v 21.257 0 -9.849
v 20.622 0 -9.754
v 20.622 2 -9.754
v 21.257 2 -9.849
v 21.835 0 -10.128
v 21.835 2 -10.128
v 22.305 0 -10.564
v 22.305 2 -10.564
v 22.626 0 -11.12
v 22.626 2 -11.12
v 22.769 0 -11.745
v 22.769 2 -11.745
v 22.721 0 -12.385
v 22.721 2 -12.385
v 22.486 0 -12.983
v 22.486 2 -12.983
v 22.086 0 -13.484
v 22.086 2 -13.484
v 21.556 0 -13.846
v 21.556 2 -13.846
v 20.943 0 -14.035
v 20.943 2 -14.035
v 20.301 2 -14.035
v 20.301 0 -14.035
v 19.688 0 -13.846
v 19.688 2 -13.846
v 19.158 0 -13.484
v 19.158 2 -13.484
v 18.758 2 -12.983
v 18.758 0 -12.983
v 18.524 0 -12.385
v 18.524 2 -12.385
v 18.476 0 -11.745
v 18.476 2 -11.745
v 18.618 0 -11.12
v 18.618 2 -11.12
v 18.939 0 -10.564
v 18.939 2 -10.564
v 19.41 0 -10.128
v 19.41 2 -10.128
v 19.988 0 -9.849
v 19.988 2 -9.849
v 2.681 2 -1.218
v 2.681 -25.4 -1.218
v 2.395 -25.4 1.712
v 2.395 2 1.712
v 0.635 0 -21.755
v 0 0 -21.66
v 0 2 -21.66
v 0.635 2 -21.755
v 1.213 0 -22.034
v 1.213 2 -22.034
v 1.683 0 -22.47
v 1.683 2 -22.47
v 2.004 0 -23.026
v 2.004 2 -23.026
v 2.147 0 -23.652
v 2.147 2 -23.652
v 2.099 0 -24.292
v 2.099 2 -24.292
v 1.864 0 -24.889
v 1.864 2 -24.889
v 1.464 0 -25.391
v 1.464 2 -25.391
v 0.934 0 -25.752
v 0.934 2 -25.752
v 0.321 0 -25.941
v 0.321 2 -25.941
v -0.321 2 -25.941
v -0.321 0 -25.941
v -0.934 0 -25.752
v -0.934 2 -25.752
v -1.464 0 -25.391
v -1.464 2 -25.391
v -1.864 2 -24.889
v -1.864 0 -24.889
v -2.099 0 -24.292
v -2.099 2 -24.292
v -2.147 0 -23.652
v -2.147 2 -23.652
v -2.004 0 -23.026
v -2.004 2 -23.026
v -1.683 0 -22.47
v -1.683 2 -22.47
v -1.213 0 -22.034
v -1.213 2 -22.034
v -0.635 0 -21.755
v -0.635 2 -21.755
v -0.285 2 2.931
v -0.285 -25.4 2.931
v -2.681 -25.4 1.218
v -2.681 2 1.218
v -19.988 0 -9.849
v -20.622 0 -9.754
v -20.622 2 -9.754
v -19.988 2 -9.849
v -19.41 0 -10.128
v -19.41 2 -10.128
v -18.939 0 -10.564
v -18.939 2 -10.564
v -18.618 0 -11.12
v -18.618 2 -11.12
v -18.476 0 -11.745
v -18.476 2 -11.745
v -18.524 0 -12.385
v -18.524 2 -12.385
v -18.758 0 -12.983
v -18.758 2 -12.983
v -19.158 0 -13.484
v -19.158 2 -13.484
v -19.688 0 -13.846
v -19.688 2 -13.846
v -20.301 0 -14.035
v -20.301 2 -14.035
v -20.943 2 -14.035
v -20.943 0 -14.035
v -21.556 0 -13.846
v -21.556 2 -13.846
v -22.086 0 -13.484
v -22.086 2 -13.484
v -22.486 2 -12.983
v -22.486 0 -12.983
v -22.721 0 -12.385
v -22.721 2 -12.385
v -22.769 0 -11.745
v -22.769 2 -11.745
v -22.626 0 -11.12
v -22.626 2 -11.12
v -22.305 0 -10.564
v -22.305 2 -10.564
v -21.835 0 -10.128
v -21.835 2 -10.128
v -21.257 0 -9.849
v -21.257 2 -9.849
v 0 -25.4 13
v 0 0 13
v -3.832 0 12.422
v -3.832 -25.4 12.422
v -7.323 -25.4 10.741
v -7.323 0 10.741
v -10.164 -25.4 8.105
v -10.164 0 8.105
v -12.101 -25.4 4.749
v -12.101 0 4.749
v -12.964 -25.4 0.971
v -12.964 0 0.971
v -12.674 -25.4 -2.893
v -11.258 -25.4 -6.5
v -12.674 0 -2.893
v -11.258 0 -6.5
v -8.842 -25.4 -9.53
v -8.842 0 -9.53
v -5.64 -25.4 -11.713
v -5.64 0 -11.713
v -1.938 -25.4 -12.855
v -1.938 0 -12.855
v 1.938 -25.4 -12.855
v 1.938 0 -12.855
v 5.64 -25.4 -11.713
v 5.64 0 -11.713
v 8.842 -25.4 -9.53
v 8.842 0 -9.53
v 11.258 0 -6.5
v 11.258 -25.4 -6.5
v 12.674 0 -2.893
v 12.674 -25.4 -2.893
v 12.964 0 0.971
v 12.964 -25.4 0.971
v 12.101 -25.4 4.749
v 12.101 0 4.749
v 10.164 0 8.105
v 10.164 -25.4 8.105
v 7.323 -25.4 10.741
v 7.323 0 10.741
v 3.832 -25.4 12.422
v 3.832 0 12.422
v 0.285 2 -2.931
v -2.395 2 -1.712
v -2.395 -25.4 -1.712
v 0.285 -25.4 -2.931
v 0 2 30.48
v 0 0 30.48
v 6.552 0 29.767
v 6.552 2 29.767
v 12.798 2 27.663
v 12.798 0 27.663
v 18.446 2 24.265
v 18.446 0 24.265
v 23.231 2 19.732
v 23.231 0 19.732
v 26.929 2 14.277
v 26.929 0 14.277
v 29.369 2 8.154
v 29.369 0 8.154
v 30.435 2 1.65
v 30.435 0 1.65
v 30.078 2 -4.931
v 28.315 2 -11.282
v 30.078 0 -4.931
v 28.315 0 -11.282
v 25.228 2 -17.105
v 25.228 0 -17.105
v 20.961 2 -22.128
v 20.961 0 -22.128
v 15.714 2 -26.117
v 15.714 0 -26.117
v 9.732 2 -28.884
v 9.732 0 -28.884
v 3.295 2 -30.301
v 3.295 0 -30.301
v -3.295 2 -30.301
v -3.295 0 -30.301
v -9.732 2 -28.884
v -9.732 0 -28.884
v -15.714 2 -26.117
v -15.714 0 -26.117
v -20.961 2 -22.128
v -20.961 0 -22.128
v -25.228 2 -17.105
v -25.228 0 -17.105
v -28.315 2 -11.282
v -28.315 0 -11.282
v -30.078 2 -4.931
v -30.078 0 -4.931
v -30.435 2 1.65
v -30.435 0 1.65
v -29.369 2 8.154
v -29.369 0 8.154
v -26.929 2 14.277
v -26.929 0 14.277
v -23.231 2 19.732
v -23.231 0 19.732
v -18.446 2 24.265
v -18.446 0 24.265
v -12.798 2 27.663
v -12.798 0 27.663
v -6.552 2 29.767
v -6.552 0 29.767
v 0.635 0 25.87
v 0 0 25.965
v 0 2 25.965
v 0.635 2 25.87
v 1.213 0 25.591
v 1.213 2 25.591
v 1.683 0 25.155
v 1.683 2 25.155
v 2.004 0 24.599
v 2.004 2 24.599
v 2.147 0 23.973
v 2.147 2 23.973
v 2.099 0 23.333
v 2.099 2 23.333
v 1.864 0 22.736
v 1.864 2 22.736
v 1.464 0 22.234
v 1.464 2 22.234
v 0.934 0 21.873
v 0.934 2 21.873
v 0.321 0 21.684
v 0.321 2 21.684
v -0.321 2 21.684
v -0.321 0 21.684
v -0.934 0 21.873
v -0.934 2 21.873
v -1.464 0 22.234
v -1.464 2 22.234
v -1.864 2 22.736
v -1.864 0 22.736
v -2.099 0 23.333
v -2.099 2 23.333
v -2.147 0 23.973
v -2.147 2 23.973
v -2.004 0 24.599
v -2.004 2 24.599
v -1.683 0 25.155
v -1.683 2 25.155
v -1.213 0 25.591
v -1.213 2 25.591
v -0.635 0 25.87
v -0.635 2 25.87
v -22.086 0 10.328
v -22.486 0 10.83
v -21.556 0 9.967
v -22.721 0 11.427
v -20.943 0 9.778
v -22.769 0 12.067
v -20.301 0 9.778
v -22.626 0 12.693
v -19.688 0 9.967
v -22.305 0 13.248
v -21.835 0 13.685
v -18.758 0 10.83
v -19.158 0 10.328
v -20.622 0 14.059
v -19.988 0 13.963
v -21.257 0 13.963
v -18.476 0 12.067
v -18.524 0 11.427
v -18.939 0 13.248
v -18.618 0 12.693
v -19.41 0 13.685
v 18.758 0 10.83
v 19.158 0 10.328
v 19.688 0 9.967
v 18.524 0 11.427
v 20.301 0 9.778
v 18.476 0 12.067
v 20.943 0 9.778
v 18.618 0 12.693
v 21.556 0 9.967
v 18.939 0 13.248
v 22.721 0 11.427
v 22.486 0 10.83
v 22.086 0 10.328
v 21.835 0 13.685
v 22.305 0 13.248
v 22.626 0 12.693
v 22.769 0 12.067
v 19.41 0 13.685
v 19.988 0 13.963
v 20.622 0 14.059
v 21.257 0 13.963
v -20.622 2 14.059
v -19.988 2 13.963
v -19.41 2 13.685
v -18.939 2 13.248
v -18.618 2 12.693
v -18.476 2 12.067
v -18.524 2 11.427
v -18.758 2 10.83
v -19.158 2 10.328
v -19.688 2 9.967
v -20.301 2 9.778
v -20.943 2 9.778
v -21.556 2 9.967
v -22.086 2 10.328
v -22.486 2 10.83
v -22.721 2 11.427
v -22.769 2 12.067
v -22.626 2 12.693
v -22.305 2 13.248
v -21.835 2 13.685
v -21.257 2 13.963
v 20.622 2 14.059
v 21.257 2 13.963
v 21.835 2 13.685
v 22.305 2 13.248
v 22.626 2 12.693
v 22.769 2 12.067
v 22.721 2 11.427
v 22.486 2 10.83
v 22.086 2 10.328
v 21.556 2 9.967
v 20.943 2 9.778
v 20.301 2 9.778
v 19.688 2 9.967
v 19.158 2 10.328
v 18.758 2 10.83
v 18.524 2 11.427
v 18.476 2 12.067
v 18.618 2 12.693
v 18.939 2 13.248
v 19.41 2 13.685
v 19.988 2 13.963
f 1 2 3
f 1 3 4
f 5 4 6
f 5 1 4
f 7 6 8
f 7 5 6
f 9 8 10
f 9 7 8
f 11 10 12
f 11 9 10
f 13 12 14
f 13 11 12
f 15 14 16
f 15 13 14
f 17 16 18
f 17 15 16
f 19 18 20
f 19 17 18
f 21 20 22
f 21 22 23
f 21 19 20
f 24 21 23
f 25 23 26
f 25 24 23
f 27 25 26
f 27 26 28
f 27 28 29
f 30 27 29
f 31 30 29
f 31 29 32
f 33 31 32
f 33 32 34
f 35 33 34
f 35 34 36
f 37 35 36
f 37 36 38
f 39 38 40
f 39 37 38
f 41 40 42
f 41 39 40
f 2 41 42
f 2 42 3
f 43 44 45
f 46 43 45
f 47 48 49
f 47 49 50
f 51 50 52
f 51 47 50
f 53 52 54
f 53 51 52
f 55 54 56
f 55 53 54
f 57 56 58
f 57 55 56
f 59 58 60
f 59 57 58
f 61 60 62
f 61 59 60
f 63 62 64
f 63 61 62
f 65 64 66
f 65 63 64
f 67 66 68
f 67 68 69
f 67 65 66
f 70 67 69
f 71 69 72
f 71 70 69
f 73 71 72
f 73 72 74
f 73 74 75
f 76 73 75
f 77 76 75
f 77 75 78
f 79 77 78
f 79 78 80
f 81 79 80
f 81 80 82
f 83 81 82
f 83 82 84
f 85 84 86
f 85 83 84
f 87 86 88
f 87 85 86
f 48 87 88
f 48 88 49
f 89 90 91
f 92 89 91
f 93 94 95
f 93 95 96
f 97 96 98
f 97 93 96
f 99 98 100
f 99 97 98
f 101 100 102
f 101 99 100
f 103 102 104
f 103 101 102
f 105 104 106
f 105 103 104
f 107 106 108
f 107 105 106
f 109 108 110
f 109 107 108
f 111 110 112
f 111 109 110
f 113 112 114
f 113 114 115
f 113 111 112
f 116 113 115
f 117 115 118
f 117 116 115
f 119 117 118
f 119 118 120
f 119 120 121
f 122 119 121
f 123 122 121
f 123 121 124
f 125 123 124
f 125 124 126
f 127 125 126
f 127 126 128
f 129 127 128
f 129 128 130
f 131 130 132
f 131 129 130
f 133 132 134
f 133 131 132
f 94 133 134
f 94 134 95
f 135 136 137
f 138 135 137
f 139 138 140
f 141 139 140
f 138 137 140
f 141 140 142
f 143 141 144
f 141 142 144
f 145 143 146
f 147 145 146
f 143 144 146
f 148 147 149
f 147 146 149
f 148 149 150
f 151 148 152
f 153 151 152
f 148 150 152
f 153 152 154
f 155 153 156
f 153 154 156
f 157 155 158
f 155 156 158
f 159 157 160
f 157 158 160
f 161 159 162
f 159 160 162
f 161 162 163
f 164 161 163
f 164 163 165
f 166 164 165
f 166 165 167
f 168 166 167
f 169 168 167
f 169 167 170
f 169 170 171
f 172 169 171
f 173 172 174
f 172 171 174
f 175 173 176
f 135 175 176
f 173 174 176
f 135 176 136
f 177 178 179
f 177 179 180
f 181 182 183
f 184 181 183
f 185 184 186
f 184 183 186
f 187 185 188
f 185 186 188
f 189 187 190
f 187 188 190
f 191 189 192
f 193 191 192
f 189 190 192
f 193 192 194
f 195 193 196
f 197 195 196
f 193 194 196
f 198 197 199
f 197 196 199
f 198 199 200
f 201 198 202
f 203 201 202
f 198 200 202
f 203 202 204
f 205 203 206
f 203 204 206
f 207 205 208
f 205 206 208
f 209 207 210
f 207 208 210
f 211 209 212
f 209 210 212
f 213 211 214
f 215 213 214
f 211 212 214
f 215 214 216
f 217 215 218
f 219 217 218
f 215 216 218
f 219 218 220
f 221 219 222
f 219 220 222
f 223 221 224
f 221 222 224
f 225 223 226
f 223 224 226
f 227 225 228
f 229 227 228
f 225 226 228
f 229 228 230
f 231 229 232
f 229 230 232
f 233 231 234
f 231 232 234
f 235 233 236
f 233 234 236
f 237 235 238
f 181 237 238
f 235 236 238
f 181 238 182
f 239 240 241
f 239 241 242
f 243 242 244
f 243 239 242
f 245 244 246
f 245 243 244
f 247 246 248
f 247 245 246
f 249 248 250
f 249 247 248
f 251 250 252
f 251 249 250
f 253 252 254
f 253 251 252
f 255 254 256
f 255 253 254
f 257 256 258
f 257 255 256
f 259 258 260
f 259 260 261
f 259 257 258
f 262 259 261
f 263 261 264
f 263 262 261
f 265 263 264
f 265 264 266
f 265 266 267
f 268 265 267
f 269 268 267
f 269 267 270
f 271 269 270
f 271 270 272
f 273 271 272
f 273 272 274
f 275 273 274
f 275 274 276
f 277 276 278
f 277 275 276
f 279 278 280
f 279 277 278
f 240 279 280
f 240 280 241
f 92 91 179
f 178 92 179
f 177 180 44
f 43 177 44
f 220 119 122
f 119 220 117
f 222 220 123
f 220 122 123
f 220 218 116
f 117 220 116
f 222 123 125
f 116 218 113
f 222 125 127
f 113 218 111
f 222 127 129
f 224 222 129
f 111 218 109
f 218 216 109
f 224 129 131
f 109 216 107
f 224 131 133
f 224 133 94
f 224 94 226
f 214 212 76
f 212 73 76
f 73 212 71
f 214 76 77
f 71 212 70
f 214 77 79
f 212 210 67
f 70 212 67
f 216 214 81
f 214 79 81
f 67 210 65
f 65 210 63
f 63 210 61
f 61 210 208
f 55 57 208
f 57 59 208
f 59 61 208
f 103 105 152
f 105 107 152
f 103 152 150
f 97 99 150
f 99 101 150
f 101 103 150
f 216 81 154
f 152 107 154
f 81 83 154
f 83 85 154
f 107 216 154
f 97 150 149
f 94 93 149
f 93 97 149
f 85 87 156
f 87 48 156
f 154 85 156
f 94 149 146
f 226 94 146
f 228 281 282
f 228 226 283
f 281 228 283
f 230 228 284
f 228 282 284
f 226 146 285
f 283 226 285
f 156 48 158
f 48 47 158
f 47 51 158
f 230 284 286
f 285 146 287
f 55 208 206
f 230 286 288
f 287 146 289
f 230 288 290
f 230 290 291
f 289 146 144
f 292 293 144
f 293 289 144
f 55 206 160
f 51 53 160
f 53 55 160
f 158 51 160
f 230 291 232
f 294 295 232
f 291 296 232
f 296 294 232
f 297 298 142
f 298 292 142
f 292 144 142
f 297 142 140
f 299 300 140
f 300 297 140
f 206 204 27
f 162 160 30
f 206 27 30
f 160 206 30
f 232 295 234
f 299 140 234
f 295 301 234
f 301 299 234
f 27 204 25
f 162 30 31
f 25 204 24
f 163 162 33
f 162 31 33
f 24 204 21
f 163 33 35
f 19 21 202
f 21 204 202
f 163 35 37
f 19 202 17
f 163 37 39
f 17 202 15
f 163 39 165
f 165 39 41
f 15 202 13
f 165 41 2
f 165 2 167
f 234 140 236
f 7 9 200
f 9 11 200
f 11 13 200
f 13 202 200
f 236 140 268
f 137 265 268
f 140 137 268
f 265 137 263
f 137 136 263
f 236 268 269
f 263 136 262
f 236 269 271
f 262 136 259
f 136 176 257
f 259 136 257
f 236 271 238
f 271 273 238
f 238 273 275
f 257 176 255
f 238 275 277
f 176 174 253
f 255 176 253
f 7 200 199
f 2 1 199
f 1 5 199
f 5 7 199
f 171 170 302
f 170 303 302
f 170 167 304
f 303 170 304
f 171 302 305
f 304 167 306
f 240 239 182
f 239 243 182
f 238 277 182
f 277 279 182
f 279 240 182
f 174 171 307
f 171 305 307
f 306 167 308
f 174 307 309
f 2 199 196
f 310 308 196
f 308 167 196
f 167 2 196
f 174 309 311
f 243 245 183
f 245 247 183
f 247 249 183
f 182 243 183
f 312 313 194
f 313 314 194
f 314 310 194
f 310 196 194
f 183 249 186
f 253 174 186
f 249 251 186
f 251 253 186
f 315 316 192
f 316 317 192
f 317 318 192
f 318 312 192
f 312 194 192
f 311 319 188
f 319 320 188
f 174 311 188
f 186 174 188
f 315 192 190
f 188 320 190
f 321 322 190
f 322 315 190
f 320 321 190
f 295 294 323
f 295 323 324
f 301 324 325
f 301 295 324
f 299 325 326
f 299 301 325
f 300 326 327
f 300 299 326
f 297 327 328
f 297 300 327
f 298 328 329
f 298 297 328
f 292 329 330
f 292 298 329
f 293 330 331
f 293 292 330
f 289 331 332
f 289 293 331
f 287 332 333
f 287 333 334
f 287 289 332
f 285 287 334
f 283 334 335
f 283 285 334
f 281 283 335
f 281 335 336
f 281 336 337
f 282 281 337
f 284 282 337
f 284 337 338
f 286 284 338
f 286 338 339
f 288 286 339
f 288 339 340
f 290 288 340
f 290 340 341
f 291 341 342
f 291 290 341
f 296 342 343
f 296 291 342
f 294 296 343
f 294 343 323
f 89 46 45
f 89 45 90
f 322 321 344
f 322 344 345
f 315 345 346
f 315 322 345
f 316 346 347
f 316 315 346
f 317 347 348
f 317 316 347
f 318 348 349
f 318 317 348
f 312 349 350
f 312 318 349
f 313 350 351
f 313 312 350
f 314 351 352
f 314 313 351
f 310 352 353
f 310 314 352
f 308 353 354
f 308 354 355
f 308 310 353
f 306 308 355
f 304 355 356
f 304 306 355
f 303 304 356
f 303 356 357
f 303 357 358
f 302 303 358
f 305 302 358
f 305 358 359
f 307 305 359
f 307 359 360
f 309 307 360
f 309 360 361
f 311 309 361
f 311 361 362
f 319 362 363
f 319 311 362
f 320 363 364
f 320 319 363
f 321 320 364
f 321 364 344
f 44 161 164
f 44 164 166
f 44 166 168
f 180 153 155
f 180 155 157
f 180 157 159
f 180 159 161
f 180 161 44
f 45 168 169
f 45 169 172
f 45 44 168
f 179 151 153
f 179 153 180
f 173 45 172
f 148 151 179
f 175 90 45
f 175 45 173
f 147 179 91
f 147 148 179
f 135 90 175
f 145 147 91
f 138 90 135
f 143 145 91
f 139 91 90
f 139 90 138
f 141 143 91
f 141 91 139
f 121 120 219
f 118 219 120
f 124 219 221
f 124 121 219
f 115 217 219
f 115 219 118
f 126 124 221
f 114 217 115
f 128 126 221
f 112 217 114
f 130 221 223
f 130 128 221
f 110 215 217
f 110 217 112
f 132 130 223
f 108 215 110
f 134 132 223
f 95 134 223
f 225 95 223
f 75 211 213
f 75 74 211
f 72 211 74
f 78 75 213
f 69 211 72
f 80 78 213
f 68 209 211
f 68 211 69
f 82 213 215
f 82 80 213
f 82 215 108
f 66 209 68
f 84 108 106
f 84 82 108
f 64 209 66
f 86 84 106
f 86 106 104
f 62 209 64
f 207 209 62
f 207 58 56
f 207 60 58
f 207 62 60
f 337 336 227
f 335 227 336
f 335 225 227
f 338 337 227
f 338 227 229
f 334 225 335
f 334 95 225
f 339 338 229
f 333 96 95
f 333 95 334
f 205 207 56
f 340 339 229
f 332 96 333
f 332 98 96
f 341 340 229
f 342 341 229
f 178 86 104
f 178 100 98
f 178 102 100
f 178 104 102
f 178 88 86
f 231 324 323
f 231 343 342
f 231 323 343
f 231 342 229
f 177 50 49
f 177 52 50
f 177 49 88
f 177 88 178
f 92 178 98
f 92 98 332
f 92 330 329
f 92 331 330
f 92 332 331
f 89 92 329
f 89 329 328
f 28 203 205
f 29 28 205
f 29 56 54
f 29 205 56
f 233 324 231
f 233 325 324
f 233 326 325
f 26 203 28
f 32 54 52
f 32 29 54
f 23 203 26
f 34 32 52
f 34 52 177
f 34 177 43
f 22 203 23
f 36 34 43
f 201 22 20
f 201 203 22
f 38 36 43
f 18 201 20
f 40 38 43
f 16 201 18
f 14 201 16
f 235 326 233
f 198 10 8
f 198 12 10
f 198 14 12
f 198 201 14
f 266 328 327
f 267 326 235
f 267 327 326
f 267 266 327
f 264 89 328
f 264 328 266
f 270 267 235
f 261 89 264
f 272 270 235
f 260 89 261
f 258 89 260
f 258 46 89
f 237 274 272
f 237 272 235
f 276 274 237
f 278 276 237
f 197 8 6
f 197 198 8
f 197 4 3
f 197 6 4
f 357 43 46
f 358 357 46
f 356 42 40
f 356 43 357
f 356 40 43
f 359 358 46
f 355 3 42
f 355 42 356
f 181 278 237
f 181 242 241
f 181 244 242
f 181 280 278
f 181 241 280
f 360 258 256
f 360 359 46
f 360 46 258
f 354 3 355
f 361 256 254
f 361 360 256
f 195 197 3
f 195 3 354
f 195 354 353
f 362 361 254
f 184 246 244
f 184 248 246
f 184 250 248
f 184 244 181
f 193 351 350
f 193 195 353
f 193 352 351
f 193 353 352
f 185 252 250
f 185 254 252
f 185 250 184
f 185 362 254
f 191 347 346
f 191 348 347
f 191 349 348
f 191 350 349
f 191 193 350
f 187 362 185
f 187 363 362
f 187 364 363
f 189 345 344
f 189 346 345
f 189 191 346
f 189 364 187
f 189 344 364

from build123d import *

# Parameters (mm, degrees)
SKETCH1_R           = 30.48
SKETCH1_R_2         = 2.15265
BOSS_EXTRUDE1_DEPTH = 2
CUT_EXTRUDE1_DEPTH  = 10
SKETCH3_R           = 13
BOSS_EXTRUDE2_DEPTH = 25.4


with BuildPart() as part:
    # Sketch1 → Boss-Extrude1 (new body)
    with BuildSketch(Plane(origin=(0, 0, 0), x_dir=(1, 0, 0), z_dir=(0, 1, 0))):
        with Locations(Location((0, 0, 0), (0, 0, 270))):
            Circle(SKETCH1_R)
        with Locations(Location((0, -23.8125, 0), (0, 0, 270))):
            Circle(SKETCH1_R_2, mode=Mode.SUBTRACT)
        with Locations(Location((20.622229928, -11.90625, 0), (0, 0, 270))):
            Circle(SKETCH1_R_2, mode=Mode.SUBTRACT)
        with Locations(Location((20.622229928, 11.90625, 0), (0, 0, 270))):
            Circle(SKETCH1_R_2, mode=Mode.SUBTRACT)
        with Locations(Location((0, 23.8125, 0), (0, 0, 270))):
            Circle(SKETCH1_R_2, mode=Mode.SUBTRACT)
        with Locations(Location((-20.622229928, 11.90625, 0), (0, 0, 270))):
            Circle(SKETCH1_R_2, mode=Mode.SUBTRACT)
        with Locations(Location((-20.622229928, -11.90625, 0), (0, 0, 270))):
            Circle(SKETCH1_R_2, mode=Mode.SUBTRACT)
    extrude(amount=BOSS_EXTRUDE1_DEPTH)

    # Sketch2 → Cut-Extrude1 (cut)
    with BuildSketch(Plane(origin=(0, 2, 0), x_dir=(1, 0, 0), z_dir=(0, 1, 0))):
        Polygon((-2.680603767, -1.218344551), (-0.285184552, -2.930643235), (2.395419215, -1.712298684), (2.680603767, 1.218344551), (0.285184552, 2.930643235), (-2.395419215, 1.712298684), align=None)
    extrude(amount=-CUT_EXTRUDE1_DEPTH, mode=Mode.SUBTRACT)

    # Sketch3 → Boss-Extrude2 (add)
    with BuildSketch(Plane.XZ):
        with Locations(Location((0, 0, 0), (0, 0, 90))):
            Circle(SKETCH3_R)
        Polygon((-0.285184552, 2.930643235), (-2.680603767, 1.218344551), (-2.395419215, -1.712298684), (0.285184552, -2.930643235), (2.680603767, -1.218344551), (2.395419215, 1.712298684), align=None, mode=Mode.SUBTRACT)
    extrude(amount=BOSS_EXTRUDE2_DEPTH)


solid = part.part
